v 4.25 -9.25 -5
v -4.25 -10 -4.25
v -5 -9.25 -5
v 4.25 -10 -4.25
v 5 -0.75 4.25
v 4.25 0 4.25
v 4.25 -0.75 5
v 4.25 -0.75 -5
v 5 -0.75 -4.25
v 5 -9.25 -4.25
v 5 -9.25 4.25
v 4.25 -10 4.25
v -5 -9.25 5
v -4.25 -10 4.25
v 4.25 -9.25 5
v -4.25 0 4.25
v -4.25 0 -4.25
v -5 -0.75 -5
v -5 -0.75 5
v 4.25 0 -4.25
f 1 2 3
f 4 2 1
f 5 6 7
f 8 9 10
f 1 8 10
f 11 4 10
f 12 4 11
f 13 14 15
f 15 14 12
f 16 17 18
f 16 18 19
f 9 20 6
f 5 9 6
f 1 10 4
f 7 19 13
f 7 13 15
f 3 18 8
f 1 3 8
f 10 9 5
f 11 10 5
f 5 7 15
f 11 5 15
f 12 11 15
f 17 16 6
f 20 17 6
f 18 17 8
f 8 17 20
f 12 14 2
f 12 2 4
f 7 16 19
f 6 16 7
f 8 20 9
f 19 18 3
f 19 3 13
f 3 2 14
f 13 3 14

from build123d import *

# Parameters (mm, degrees)
F0_W     = 10
F0_H     = 10
F1_DEPTH = 10
F2_SIZE  = 0.75


with BuildPart() as f1:
    # F0 (on Front) → F1 (new body)
    with BuildSketch(Plane.XZ):
        Rectangle(F0_W, F0_H)
    extrude(amount=F1_DEPTH)

    # F2
    f2_edges = [f1.edges().sort_by_distance(p)[0] for p in [
        (0, 0, 5),
        (-5, 0, 0),
        (0, 0, -5),
        (5, 0, 0),
        (5, -5, -5),
        (5, -5, 5),
        (5, -10, 0),
        (0, -10, -5),
        (0, -10, 5),
        (-5, -10, 0),
    ]]
    chamfer(f2_edges, length=F2_SIZE)


solid = f1.part
